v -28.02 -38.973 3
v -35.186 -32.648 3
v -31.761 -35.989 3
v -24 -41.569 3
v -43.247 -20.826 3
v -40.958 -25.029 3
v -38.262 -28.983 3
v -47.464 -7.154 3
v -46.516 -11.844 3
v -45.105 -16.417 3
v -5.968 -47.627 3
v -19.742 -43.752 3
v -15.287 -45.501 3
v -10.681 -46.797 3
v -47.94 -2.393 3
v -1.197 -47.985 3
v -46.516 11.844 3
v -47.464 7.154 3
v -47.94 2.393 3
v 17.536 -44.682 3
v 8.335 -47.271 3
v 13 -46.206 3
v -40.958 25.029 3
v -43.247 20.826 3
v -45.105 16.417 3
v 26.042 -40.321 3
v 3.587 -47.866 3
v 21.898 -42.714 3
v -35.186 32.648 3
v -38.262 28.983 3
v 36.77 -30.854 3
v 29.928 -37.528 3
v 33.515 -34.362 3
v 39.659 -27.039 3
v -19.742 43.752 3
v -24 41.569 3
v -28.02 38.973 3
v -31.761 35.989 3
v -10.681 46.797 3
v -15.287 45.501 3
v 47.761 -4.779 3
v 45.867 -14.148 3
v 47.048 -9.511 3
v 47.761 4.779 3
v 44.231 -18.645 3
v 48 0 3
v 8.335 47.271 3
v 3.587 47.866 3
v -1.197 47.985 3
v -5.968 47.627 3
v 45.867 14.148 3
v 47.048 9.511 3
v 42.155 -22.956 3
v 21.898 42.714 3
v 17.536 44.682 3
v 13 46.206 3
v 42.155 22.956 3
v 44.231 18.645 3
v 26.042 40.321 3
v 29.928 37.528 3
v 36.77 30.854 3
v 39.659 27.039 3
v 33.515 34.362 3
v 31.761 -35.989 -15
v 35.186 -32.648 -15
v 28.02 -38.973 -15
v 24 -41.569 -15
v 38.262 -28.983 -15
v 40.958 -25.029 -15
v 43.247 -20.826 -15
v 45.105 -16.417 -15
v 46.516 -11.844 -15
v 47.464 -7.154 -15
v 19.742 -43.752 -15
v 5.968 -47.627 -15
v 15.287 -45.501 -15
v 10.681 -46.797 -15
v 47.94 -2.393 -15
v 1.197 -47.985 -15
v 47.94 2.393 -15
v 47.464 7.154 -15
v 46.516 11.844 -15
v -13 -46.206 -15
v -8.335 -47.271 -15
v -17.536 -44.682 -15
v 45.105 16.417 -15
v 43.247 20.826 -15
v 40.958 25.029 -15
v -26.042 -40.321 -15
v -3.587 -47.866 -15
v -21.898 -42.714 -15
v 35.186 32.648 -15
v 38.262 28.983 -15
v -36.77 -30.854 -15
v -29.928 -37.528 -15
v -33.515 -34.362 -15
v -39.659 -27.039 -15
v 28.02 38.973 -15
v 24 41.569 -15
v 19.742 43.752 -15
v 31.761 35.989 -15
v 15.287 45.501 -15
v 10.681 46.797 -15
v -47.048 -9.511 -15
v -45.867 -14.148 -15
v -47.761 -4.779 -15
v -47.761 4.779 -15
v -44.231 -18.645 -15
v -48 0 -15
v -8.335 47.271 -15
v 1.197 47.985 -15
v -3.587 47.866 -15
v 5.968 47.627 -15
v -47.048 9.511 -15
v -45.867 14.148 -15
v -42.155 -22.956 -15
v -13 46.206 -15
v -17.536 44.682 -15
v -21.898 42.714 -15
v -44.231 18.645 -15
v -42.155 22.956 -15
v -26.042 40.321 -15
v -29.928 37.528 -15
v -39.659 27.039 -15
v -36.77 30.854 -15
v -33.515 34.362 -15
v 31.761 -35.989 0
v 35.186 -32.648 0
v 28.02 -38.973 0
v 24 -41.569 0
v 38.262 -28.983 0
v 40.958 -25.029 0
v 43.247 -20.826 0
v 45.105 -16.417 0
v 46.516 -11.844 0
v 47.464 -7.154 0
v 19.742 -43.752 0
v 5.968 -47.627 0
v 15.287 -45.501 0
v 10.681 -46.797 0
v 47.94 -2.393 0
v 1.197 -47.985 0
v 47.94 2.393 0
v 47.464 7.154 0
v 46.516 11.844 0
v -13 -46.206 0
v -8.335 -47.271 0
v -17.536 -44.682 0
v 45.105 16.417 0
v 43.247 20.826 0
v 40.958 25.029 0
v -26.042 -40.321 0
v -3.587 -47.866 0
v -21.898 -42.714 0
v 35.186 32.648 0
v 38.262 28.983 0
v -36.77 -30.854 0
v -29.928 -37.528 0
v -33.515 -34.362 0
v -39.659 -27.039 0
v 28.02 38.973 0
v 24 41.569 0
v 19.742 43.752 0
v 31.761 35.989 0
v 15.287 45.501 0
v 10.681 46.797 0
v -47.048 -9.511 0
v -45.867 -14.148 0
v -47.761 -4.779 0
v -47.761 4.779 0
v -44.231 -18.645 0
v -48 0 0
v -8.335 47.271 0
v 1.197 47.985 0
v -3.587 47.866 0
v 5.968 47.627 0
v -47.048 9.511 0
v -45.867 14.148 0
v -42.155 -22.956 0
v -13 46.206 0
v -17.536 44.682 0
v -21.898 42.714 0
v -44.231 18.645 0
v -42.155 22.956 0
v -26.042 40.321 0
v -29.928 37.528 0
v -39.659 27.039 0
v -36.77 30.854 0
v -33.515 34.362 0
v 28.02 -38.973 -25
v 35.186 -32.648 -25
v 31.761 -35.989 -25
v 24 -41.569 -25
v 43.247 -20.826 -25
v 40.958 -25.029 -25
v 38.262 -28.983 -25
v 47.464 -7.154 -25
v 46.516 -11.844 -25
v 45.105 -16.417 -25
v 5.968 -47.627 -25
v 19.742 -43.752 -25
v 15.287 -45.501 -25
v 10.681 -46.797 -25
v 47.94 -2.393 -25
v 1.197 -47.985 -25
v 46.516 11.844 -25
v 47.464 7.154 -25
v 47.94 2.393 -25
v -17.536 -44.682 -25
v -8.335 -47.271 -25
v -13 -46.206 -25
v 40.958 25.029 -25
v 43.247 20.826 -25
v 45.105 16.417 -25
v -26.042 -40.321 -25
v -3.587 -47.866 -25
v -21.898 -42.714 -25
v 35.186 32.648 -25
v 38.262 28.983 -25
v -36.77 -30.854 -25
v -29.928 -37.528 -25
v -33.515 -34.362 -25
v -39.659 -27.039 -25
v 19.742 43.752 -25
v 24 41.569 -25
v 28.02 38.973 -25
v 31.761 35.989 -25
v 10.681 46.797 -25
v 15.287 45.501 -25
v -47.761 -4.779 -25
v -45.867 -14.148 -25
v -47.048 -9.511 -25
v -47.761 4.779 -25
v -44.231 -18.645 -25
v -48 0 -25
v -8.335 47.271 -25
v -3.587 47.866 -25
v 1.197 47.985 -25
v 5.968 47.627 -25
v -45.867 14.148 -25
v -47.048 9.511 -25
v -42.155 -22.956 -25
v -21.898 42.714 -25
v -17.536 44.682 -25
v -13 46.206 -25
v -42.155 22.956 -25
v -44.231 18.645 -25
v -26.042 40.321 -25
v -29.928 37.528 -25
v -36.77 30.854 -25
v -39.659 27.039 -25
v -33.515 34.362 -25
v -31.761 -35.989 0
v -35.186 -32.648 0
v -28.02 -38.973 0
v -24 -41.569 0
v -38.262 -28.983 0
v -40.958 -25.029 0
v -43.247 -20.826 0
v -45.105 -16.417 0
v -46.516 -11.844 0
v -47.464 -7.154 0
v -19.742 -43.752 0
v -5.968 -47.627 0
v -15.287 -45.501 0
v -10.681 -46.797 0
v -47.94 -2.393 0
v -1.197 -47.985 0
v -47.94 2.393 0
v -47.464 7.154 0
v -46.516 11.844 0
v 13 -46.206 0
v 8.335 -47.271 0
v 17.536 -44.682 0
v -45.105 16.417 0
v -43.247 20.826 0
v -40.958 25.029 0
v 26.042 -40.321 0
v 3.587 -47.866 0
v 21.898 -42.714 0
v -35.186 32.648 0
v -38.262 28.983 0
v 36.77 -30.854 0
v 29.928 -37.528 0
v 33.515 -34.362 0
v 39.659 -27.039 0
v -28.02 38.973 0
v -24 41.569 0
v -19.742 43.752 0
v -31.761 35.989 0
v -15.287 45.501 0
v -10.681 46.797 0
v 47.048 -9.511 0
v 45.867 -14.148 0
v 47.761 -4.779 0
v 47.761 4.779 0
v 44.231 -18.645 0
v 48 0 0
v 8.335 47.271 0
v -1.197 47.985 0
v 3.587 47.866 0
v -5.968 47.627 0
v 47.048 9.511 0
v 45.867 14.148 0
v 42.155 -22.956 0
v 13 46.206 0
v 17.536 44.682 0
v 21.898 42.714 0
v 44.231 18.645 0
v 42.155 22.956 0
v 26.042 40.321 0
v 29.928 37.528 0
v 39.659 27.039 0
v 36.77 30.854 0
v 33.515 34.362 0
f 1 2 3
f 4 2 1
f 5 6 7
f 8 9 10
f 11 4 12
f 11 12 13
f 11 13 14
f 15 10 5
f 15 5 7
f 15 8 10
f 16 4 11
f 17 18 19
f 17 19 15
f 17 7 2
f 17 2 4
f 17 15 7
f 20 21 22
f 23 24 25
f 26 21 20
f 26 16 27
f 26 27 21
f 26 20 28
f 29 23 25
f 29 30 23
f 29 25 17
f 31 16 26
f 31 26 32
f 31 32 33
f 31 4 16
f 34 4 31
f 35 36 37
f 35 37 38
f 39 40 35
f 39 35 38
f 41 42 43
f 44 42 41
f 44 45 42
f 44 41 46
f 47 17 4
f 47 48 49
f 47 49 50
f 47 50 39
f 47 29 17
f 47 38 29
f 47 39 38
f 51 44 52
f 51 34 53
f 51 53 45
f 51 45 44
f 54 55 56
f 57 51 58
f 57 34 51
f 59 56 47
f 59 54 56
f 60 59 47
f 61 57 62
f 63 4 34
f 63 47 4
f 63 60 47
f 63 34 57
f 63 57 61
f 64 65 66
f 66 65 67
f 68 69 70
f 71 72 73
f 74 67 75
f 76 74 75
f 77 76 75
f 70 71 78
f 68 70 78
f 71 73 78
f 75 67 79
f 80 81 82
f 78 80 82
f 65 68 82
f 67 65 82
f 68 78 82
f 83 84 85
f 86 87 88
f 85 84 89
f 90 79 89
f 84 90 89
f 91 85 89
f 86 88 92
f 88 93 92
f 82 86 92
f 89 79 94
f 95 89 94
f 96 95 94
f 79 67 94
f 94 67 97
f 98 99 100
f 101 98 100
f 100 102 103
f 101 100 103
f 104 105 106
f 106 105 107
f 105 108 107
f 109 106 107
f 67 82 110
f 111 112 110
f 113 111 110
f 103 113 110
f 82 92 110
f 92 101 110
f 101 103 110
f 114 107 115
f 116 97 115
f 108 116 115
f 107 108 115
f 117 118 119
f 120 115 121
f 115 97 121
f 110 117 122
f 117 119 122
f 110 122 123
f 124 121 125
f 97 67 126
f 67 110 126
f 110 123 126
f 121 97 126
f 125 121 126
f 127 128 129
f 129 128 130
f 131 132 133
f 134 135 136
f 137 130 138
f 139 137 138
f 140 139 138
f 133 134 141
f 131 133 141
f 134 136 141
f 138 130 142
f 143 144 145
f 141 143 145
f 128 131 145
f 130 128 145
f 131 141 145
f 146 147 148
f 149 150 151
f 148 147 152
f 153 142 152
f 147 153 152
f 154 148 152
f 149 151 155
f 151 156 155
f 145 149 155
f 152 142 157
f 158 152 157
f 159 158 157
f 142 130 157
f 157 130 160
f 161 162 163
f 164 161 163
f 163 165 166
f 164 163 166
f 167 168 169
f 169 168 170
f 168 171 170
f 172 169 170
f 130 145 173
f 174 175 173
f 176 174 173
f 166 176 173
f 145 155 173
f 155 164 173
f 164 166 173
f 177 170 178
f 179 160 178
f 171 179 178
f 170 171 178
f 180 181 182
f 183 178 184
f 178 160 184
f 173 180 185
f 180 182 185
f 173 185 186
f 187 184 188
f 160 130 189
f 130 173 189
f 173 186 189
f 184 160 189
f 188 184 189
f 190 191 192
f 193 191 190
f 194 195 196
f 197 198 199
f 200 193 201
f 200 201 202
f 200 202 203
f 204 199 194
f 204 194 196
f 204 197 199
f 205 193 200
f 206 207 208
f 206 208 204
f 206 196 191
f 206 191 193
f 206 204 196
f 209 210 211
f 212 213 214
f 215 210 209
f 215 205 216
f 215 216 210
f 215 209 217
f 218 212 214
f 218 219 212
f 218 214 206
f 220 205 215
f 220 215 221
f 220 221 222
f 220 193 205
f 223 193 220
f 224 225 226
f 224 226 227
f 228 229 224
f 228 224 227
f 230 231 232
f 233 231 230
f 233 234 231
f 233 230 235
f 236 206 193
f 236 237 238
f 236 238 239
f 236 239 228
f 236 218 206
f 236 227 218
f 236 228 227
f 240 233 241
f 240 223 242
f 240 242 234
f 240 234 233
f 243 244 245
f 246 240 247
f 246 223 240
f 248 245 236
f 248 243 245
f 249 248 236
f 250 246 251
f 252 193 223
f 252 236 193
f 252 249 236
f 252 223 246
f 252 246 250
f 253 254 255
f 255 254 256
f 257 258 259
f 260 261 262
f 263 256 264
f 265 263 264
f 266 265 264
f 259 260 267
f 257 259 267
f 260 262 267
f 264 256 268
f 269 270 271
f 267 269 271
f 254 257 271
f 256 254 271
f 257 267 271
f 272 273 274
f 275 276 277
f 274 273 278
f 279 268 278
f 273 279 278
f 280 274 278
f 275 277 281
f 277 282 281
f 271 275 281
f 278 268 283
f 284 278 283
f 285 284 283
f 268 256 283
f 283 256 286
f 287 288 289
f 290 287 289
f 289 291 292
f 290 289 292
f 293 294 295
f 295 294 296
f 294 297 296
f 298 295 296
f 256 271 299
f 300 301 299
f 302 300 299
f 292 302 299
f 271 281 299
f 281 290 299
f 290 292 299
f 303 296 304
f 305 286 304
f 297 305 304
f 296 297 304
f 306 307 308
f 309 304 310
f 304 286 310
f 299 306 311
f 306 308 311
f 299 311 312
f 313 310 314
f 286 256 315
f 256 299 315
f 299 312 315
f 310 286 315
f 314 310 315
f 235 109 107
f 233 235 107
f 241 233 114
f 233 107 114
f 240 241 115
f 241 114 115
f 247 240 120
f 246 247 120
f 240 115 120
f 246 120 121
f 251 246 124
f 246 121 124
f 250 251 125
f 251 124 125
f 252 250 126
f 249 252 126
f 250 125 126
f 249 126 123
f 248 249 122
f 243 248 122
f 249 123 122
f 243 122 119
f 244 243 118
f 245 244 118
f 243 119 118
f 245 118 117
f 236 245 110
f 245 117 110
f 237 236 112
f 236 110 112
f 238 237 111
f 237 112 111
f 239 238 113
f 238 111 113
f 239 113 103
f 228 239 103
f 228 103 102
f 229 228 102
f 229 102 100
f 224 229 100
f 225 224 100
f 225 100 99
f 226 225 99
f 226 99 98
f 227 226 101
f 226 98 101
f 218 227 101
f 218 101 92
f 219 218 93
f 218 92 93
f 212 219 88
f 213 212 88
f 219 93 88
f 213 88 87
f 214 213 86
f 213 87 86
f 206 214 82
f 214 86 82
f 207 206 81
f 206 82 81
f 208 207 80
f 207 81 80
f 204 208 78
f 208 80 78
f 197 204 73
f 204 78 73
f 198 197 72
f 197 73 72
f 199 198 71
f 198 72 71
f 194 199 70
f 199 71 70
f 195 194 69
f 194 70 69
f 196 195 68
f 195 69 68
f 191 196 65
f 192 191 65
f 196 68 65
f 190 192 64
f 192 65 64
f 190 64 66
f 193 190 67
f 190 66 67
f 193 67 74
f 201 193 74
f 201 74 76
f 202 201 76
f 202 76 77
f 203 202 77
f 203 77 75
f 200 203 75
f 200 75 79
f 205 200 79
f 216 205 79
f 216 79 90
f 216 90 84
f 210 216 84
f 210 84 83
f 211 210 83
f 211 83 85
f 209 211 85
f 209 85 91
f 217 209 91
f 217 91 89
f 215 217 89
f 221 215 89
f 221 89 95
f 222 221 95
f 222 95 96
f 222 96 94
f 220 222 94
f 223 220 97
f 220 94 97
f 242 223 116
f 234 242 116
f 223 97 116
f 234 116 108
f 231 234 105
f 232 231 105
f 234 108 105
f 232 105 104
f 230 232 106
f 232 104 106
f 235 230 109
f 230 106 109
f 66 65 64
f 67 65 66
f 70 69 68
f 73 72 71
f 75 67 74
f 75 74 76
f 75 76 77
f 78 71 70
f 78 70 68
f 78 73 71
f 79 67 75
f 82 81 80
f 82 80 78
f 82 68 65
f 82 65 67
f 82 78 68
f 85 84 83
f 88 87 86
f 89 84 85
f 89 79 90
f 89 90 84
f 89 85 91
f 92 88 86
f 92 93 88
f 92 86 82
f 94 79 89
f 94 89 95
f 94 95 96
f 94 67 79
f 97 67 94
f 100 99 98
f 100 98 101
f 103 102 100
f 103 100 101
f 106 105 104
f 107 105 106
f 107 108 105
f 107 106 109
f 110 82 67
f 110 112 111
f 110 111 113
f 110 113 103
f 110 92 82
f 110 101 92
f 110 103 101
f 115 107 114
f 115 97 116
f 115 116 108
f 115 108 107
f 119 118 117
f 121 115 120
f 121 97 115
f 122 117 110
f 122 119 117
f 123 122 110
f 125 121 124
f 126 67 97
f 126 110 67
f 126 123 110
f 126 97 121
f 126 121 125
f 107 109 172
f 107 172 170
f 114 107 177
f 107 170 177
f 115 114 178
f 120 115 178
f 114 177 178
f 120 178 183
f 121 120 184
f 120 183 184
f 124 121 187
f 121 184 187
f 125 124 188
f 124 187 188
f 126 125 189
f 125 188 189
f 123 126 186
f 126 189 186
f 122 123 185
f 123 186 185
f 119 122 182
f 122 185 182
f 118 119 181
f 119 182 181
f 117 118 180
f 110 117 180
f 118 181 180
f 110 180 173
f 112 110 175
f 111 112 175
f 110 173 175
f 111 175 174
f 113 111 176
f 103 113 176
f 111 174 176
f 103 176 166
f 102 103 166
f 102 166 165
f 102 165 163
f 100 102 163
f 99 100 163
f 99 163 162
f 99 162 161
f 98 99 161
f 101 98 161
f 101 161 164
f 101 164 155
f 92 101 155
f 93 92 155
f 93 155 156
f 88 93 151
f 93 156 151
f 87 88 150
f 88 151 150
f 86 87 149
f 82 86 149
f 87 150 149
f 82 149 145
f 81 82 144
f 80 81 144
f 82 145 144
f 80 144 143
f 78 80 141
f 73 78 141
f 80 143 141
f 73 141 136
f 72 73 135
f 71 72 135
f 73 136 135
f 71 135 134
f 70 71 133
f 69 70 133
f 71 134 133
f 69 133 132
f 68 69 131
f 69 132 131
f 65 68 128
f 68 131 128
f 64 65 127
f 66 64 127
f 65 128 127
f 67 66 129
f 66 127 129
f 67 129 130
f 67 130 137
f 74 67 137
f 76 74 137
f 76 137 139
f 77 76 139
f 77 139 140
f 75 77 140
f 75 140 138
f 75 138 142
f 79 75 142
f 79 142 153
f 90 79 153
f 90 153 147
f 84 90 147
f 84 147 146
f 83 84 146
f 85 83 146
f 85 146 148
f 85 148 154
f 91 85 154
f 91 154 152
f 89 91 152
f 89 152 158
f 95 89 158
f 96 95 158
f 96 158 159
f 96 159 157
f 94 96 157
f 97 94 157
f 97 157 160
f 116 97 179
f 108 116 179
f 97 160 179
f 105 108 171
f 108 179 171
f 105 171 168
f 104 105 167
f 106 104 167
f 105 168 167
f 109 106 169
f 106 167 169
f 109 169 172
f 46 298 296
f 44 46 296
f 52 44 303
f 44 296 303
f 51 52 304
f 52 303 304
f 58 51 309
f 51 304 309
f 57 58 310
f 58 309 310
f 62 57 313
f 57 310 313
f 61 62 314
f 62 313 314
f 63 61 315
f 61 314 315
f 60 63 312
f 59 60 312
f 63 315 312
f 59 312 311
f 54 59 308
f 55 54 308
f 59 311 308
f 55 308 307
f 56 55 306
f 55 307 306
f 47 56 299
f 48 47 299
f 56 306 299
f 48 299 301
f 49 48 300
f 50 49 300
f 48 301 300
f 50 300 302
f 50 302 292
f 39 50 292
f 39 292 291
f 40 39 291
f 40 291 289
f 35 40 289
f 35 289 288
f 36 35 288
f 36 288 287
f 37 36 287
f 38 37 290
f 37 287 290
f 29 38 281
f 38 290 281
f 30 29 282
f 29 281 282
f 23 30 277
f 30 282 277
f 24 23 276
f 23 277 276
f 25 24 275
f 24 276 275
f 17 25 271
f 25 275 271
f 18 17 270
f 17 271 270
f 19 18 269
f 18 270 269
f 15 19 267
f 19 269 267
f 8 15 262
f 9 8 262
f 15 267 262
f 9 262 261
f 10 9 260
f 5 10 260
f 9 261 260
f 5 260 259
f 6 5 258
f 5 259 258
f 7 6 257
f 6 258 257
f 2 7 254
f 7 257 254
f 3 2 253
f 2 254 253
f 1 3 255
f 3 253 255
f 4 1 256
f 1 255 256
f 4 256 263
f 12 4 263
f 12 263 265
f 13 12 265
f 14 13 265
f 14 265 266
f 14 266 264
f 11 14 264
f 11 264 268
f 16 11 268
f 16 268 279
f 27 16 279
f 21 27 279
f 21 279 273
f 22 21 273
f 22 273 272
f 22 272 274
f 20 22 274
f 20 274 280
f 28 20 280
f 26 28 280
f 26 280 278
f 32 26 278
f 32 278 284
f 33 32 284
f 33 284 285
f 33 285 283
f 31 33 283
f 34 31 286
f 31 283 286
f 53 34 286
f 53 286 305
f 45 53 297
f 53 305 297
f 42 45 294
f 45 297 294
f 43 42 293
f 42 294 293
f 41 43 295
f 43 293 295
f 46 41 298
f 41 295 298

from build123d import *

# Parameters (mm, degrees)
SKETCH1_R           = 48
BOSS_EXTRUDE1_DEPTH = 3
SKETCH2_R           = 48
BOSS_EXTRUDE3_DEPTH = 15
SKETCH4_R           = 48
BOSS_EXTRUDE4_DEPTH = 10


with BuildPart() as part:
    # Sketch1 → Boss-Extrude1 (new body)
    with BuildSketch(Plane.XY):
        Circle(SKETCH1_R)
    extrude(amount=BOSS_EXTRUDE1_DEPTH)


with BuildPart() as body_2:
    # Sketch2 → Boss-Extrude3 (new body)
    with BuildSketch(Plane(origin=(0, 0, 0), x_dir=(-1, 0, 0), z_dir=(0, 0, -1))):
        Circle(SKETCH2_R)
    extrude(amount=BOSS_EXTRUDE3_DEPTH)


with BuildPart() as body_3:
    # Sketch4 → Boss-Extrude4 (new body)
    with BuildSketch(Plane(origin=(0, 0, -15), x_dir=(-1, 0, 0), z_dir=(0, 0, -1))):
        Circle(SKETCH4_R)
    extrude(amount=BOSS_EXTRUDE4_DEPTH)


solid = Compound([part.part, body_2.part, body_3.part])
